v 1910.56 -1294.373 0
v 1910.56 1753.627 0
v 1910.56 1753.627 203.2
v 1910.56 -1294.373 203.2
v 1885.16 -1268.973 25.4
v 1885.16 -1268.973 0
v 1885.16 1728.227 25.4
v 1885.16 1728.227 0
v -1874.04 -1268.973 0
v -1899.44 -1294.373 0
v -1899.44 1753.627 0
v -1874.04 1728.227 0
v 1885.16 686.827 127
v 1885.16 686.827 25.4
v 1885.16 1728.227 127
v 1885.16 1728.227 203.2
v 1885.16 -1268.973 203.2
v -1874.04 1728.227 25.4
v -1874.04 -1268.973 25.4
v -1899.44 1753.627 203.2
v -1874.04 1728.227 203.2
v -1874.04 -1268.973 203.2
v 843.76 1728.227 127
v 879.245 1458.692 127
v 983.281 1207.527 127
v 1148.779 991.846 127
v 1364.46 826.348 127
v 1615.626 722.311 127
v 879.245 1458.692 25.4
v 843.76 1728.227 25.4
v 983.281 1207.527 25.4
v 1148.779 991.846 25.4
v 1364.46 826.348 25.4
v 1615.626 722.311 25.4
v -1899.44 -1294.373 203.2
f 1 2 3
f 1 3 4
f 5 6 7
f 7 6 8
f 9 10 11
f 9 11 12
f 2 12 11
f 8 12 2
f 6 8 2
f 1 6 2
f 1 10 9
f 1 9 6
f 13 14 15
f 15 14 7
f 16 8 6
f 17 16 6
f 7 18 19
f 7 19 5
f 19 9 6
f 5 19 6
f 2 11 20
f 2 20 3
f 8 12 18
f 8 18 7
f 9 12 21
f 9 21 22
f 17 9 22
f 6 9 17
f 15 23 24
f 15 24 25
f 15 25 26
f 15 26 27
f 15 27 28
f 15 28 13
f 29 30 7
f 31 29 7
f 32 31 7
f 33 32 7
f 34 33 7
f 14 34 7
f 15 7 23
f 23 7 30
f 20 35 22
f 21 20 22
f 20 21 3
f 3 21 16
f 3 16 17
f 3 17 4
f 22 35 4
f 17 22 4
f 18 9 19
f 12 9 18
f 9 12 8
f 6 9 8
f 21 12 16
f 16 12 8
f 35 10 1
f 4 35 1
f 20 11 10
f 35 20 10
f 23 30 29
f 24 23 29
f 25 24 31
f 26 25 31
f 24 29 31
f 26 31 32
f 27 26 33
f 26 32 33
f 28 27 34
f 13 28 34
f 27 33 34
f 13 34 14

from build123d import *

# Parameters (mm, degrees)
F0_W     = 3759.2
F0_H     = 2997.2
F1_DEPTH = 25.4
F2_W     = 3810
F2_H     = 3048
F2_W_2   = 3759.2
F2_H_2   = 2997.2
F3_DEPTH = 203.2
F5_DEPTH = 101.6


with BuildPart() as f1:
    # F0 (on Top) → F1 (new body)
    with BuildSketch(Plane.XY):
        with Locations((5.5601783097, 229.6265830756)):
            Rectangle(F0_W, F0_H)
    extrude(amount=F1_DEPTH)


with BuildPart() as f3:
    # F2 (on face) → F3 (new body)
    with BuildSketch(Plane(origin=(0, 0, 0), x_dir=(1, 0, 0), z_dir=(0, 0, -1))):
        with Locations((5.5601783097, -229.6265830756)):
            Rectangle(F2_W, F2_H)
        with Locations((5.5601783097, -229.6265830756)):
            Rectangle(F2_W_2, F2_H_2, mode=Mode.SUBTRACT)
    extrude(amount=-F3_DEPTH)


with BuildPart() as f5:
    # F4 (on face) → F5 (new body)
    with BuildSketch(Plane.XY.offset(25.4)):
        with BuildLine():
            Line((1885.1601783097, 1728.2265830756), (843.7601783097, 1728.2265830756))
            ThreePointArc((843.7601783097, 1728.2265830756), (1148.779176382, 991.8455811479), (1885.1601783097, 686.8265830756))
            Line((1885.1601783097, 686.8265830756), (1885.1601783097, 1728.2265830756))
        make_face()
    extrude(amount=F5_DEPTH)


solid = Compound([f1.part, f3.part, f5.part])
